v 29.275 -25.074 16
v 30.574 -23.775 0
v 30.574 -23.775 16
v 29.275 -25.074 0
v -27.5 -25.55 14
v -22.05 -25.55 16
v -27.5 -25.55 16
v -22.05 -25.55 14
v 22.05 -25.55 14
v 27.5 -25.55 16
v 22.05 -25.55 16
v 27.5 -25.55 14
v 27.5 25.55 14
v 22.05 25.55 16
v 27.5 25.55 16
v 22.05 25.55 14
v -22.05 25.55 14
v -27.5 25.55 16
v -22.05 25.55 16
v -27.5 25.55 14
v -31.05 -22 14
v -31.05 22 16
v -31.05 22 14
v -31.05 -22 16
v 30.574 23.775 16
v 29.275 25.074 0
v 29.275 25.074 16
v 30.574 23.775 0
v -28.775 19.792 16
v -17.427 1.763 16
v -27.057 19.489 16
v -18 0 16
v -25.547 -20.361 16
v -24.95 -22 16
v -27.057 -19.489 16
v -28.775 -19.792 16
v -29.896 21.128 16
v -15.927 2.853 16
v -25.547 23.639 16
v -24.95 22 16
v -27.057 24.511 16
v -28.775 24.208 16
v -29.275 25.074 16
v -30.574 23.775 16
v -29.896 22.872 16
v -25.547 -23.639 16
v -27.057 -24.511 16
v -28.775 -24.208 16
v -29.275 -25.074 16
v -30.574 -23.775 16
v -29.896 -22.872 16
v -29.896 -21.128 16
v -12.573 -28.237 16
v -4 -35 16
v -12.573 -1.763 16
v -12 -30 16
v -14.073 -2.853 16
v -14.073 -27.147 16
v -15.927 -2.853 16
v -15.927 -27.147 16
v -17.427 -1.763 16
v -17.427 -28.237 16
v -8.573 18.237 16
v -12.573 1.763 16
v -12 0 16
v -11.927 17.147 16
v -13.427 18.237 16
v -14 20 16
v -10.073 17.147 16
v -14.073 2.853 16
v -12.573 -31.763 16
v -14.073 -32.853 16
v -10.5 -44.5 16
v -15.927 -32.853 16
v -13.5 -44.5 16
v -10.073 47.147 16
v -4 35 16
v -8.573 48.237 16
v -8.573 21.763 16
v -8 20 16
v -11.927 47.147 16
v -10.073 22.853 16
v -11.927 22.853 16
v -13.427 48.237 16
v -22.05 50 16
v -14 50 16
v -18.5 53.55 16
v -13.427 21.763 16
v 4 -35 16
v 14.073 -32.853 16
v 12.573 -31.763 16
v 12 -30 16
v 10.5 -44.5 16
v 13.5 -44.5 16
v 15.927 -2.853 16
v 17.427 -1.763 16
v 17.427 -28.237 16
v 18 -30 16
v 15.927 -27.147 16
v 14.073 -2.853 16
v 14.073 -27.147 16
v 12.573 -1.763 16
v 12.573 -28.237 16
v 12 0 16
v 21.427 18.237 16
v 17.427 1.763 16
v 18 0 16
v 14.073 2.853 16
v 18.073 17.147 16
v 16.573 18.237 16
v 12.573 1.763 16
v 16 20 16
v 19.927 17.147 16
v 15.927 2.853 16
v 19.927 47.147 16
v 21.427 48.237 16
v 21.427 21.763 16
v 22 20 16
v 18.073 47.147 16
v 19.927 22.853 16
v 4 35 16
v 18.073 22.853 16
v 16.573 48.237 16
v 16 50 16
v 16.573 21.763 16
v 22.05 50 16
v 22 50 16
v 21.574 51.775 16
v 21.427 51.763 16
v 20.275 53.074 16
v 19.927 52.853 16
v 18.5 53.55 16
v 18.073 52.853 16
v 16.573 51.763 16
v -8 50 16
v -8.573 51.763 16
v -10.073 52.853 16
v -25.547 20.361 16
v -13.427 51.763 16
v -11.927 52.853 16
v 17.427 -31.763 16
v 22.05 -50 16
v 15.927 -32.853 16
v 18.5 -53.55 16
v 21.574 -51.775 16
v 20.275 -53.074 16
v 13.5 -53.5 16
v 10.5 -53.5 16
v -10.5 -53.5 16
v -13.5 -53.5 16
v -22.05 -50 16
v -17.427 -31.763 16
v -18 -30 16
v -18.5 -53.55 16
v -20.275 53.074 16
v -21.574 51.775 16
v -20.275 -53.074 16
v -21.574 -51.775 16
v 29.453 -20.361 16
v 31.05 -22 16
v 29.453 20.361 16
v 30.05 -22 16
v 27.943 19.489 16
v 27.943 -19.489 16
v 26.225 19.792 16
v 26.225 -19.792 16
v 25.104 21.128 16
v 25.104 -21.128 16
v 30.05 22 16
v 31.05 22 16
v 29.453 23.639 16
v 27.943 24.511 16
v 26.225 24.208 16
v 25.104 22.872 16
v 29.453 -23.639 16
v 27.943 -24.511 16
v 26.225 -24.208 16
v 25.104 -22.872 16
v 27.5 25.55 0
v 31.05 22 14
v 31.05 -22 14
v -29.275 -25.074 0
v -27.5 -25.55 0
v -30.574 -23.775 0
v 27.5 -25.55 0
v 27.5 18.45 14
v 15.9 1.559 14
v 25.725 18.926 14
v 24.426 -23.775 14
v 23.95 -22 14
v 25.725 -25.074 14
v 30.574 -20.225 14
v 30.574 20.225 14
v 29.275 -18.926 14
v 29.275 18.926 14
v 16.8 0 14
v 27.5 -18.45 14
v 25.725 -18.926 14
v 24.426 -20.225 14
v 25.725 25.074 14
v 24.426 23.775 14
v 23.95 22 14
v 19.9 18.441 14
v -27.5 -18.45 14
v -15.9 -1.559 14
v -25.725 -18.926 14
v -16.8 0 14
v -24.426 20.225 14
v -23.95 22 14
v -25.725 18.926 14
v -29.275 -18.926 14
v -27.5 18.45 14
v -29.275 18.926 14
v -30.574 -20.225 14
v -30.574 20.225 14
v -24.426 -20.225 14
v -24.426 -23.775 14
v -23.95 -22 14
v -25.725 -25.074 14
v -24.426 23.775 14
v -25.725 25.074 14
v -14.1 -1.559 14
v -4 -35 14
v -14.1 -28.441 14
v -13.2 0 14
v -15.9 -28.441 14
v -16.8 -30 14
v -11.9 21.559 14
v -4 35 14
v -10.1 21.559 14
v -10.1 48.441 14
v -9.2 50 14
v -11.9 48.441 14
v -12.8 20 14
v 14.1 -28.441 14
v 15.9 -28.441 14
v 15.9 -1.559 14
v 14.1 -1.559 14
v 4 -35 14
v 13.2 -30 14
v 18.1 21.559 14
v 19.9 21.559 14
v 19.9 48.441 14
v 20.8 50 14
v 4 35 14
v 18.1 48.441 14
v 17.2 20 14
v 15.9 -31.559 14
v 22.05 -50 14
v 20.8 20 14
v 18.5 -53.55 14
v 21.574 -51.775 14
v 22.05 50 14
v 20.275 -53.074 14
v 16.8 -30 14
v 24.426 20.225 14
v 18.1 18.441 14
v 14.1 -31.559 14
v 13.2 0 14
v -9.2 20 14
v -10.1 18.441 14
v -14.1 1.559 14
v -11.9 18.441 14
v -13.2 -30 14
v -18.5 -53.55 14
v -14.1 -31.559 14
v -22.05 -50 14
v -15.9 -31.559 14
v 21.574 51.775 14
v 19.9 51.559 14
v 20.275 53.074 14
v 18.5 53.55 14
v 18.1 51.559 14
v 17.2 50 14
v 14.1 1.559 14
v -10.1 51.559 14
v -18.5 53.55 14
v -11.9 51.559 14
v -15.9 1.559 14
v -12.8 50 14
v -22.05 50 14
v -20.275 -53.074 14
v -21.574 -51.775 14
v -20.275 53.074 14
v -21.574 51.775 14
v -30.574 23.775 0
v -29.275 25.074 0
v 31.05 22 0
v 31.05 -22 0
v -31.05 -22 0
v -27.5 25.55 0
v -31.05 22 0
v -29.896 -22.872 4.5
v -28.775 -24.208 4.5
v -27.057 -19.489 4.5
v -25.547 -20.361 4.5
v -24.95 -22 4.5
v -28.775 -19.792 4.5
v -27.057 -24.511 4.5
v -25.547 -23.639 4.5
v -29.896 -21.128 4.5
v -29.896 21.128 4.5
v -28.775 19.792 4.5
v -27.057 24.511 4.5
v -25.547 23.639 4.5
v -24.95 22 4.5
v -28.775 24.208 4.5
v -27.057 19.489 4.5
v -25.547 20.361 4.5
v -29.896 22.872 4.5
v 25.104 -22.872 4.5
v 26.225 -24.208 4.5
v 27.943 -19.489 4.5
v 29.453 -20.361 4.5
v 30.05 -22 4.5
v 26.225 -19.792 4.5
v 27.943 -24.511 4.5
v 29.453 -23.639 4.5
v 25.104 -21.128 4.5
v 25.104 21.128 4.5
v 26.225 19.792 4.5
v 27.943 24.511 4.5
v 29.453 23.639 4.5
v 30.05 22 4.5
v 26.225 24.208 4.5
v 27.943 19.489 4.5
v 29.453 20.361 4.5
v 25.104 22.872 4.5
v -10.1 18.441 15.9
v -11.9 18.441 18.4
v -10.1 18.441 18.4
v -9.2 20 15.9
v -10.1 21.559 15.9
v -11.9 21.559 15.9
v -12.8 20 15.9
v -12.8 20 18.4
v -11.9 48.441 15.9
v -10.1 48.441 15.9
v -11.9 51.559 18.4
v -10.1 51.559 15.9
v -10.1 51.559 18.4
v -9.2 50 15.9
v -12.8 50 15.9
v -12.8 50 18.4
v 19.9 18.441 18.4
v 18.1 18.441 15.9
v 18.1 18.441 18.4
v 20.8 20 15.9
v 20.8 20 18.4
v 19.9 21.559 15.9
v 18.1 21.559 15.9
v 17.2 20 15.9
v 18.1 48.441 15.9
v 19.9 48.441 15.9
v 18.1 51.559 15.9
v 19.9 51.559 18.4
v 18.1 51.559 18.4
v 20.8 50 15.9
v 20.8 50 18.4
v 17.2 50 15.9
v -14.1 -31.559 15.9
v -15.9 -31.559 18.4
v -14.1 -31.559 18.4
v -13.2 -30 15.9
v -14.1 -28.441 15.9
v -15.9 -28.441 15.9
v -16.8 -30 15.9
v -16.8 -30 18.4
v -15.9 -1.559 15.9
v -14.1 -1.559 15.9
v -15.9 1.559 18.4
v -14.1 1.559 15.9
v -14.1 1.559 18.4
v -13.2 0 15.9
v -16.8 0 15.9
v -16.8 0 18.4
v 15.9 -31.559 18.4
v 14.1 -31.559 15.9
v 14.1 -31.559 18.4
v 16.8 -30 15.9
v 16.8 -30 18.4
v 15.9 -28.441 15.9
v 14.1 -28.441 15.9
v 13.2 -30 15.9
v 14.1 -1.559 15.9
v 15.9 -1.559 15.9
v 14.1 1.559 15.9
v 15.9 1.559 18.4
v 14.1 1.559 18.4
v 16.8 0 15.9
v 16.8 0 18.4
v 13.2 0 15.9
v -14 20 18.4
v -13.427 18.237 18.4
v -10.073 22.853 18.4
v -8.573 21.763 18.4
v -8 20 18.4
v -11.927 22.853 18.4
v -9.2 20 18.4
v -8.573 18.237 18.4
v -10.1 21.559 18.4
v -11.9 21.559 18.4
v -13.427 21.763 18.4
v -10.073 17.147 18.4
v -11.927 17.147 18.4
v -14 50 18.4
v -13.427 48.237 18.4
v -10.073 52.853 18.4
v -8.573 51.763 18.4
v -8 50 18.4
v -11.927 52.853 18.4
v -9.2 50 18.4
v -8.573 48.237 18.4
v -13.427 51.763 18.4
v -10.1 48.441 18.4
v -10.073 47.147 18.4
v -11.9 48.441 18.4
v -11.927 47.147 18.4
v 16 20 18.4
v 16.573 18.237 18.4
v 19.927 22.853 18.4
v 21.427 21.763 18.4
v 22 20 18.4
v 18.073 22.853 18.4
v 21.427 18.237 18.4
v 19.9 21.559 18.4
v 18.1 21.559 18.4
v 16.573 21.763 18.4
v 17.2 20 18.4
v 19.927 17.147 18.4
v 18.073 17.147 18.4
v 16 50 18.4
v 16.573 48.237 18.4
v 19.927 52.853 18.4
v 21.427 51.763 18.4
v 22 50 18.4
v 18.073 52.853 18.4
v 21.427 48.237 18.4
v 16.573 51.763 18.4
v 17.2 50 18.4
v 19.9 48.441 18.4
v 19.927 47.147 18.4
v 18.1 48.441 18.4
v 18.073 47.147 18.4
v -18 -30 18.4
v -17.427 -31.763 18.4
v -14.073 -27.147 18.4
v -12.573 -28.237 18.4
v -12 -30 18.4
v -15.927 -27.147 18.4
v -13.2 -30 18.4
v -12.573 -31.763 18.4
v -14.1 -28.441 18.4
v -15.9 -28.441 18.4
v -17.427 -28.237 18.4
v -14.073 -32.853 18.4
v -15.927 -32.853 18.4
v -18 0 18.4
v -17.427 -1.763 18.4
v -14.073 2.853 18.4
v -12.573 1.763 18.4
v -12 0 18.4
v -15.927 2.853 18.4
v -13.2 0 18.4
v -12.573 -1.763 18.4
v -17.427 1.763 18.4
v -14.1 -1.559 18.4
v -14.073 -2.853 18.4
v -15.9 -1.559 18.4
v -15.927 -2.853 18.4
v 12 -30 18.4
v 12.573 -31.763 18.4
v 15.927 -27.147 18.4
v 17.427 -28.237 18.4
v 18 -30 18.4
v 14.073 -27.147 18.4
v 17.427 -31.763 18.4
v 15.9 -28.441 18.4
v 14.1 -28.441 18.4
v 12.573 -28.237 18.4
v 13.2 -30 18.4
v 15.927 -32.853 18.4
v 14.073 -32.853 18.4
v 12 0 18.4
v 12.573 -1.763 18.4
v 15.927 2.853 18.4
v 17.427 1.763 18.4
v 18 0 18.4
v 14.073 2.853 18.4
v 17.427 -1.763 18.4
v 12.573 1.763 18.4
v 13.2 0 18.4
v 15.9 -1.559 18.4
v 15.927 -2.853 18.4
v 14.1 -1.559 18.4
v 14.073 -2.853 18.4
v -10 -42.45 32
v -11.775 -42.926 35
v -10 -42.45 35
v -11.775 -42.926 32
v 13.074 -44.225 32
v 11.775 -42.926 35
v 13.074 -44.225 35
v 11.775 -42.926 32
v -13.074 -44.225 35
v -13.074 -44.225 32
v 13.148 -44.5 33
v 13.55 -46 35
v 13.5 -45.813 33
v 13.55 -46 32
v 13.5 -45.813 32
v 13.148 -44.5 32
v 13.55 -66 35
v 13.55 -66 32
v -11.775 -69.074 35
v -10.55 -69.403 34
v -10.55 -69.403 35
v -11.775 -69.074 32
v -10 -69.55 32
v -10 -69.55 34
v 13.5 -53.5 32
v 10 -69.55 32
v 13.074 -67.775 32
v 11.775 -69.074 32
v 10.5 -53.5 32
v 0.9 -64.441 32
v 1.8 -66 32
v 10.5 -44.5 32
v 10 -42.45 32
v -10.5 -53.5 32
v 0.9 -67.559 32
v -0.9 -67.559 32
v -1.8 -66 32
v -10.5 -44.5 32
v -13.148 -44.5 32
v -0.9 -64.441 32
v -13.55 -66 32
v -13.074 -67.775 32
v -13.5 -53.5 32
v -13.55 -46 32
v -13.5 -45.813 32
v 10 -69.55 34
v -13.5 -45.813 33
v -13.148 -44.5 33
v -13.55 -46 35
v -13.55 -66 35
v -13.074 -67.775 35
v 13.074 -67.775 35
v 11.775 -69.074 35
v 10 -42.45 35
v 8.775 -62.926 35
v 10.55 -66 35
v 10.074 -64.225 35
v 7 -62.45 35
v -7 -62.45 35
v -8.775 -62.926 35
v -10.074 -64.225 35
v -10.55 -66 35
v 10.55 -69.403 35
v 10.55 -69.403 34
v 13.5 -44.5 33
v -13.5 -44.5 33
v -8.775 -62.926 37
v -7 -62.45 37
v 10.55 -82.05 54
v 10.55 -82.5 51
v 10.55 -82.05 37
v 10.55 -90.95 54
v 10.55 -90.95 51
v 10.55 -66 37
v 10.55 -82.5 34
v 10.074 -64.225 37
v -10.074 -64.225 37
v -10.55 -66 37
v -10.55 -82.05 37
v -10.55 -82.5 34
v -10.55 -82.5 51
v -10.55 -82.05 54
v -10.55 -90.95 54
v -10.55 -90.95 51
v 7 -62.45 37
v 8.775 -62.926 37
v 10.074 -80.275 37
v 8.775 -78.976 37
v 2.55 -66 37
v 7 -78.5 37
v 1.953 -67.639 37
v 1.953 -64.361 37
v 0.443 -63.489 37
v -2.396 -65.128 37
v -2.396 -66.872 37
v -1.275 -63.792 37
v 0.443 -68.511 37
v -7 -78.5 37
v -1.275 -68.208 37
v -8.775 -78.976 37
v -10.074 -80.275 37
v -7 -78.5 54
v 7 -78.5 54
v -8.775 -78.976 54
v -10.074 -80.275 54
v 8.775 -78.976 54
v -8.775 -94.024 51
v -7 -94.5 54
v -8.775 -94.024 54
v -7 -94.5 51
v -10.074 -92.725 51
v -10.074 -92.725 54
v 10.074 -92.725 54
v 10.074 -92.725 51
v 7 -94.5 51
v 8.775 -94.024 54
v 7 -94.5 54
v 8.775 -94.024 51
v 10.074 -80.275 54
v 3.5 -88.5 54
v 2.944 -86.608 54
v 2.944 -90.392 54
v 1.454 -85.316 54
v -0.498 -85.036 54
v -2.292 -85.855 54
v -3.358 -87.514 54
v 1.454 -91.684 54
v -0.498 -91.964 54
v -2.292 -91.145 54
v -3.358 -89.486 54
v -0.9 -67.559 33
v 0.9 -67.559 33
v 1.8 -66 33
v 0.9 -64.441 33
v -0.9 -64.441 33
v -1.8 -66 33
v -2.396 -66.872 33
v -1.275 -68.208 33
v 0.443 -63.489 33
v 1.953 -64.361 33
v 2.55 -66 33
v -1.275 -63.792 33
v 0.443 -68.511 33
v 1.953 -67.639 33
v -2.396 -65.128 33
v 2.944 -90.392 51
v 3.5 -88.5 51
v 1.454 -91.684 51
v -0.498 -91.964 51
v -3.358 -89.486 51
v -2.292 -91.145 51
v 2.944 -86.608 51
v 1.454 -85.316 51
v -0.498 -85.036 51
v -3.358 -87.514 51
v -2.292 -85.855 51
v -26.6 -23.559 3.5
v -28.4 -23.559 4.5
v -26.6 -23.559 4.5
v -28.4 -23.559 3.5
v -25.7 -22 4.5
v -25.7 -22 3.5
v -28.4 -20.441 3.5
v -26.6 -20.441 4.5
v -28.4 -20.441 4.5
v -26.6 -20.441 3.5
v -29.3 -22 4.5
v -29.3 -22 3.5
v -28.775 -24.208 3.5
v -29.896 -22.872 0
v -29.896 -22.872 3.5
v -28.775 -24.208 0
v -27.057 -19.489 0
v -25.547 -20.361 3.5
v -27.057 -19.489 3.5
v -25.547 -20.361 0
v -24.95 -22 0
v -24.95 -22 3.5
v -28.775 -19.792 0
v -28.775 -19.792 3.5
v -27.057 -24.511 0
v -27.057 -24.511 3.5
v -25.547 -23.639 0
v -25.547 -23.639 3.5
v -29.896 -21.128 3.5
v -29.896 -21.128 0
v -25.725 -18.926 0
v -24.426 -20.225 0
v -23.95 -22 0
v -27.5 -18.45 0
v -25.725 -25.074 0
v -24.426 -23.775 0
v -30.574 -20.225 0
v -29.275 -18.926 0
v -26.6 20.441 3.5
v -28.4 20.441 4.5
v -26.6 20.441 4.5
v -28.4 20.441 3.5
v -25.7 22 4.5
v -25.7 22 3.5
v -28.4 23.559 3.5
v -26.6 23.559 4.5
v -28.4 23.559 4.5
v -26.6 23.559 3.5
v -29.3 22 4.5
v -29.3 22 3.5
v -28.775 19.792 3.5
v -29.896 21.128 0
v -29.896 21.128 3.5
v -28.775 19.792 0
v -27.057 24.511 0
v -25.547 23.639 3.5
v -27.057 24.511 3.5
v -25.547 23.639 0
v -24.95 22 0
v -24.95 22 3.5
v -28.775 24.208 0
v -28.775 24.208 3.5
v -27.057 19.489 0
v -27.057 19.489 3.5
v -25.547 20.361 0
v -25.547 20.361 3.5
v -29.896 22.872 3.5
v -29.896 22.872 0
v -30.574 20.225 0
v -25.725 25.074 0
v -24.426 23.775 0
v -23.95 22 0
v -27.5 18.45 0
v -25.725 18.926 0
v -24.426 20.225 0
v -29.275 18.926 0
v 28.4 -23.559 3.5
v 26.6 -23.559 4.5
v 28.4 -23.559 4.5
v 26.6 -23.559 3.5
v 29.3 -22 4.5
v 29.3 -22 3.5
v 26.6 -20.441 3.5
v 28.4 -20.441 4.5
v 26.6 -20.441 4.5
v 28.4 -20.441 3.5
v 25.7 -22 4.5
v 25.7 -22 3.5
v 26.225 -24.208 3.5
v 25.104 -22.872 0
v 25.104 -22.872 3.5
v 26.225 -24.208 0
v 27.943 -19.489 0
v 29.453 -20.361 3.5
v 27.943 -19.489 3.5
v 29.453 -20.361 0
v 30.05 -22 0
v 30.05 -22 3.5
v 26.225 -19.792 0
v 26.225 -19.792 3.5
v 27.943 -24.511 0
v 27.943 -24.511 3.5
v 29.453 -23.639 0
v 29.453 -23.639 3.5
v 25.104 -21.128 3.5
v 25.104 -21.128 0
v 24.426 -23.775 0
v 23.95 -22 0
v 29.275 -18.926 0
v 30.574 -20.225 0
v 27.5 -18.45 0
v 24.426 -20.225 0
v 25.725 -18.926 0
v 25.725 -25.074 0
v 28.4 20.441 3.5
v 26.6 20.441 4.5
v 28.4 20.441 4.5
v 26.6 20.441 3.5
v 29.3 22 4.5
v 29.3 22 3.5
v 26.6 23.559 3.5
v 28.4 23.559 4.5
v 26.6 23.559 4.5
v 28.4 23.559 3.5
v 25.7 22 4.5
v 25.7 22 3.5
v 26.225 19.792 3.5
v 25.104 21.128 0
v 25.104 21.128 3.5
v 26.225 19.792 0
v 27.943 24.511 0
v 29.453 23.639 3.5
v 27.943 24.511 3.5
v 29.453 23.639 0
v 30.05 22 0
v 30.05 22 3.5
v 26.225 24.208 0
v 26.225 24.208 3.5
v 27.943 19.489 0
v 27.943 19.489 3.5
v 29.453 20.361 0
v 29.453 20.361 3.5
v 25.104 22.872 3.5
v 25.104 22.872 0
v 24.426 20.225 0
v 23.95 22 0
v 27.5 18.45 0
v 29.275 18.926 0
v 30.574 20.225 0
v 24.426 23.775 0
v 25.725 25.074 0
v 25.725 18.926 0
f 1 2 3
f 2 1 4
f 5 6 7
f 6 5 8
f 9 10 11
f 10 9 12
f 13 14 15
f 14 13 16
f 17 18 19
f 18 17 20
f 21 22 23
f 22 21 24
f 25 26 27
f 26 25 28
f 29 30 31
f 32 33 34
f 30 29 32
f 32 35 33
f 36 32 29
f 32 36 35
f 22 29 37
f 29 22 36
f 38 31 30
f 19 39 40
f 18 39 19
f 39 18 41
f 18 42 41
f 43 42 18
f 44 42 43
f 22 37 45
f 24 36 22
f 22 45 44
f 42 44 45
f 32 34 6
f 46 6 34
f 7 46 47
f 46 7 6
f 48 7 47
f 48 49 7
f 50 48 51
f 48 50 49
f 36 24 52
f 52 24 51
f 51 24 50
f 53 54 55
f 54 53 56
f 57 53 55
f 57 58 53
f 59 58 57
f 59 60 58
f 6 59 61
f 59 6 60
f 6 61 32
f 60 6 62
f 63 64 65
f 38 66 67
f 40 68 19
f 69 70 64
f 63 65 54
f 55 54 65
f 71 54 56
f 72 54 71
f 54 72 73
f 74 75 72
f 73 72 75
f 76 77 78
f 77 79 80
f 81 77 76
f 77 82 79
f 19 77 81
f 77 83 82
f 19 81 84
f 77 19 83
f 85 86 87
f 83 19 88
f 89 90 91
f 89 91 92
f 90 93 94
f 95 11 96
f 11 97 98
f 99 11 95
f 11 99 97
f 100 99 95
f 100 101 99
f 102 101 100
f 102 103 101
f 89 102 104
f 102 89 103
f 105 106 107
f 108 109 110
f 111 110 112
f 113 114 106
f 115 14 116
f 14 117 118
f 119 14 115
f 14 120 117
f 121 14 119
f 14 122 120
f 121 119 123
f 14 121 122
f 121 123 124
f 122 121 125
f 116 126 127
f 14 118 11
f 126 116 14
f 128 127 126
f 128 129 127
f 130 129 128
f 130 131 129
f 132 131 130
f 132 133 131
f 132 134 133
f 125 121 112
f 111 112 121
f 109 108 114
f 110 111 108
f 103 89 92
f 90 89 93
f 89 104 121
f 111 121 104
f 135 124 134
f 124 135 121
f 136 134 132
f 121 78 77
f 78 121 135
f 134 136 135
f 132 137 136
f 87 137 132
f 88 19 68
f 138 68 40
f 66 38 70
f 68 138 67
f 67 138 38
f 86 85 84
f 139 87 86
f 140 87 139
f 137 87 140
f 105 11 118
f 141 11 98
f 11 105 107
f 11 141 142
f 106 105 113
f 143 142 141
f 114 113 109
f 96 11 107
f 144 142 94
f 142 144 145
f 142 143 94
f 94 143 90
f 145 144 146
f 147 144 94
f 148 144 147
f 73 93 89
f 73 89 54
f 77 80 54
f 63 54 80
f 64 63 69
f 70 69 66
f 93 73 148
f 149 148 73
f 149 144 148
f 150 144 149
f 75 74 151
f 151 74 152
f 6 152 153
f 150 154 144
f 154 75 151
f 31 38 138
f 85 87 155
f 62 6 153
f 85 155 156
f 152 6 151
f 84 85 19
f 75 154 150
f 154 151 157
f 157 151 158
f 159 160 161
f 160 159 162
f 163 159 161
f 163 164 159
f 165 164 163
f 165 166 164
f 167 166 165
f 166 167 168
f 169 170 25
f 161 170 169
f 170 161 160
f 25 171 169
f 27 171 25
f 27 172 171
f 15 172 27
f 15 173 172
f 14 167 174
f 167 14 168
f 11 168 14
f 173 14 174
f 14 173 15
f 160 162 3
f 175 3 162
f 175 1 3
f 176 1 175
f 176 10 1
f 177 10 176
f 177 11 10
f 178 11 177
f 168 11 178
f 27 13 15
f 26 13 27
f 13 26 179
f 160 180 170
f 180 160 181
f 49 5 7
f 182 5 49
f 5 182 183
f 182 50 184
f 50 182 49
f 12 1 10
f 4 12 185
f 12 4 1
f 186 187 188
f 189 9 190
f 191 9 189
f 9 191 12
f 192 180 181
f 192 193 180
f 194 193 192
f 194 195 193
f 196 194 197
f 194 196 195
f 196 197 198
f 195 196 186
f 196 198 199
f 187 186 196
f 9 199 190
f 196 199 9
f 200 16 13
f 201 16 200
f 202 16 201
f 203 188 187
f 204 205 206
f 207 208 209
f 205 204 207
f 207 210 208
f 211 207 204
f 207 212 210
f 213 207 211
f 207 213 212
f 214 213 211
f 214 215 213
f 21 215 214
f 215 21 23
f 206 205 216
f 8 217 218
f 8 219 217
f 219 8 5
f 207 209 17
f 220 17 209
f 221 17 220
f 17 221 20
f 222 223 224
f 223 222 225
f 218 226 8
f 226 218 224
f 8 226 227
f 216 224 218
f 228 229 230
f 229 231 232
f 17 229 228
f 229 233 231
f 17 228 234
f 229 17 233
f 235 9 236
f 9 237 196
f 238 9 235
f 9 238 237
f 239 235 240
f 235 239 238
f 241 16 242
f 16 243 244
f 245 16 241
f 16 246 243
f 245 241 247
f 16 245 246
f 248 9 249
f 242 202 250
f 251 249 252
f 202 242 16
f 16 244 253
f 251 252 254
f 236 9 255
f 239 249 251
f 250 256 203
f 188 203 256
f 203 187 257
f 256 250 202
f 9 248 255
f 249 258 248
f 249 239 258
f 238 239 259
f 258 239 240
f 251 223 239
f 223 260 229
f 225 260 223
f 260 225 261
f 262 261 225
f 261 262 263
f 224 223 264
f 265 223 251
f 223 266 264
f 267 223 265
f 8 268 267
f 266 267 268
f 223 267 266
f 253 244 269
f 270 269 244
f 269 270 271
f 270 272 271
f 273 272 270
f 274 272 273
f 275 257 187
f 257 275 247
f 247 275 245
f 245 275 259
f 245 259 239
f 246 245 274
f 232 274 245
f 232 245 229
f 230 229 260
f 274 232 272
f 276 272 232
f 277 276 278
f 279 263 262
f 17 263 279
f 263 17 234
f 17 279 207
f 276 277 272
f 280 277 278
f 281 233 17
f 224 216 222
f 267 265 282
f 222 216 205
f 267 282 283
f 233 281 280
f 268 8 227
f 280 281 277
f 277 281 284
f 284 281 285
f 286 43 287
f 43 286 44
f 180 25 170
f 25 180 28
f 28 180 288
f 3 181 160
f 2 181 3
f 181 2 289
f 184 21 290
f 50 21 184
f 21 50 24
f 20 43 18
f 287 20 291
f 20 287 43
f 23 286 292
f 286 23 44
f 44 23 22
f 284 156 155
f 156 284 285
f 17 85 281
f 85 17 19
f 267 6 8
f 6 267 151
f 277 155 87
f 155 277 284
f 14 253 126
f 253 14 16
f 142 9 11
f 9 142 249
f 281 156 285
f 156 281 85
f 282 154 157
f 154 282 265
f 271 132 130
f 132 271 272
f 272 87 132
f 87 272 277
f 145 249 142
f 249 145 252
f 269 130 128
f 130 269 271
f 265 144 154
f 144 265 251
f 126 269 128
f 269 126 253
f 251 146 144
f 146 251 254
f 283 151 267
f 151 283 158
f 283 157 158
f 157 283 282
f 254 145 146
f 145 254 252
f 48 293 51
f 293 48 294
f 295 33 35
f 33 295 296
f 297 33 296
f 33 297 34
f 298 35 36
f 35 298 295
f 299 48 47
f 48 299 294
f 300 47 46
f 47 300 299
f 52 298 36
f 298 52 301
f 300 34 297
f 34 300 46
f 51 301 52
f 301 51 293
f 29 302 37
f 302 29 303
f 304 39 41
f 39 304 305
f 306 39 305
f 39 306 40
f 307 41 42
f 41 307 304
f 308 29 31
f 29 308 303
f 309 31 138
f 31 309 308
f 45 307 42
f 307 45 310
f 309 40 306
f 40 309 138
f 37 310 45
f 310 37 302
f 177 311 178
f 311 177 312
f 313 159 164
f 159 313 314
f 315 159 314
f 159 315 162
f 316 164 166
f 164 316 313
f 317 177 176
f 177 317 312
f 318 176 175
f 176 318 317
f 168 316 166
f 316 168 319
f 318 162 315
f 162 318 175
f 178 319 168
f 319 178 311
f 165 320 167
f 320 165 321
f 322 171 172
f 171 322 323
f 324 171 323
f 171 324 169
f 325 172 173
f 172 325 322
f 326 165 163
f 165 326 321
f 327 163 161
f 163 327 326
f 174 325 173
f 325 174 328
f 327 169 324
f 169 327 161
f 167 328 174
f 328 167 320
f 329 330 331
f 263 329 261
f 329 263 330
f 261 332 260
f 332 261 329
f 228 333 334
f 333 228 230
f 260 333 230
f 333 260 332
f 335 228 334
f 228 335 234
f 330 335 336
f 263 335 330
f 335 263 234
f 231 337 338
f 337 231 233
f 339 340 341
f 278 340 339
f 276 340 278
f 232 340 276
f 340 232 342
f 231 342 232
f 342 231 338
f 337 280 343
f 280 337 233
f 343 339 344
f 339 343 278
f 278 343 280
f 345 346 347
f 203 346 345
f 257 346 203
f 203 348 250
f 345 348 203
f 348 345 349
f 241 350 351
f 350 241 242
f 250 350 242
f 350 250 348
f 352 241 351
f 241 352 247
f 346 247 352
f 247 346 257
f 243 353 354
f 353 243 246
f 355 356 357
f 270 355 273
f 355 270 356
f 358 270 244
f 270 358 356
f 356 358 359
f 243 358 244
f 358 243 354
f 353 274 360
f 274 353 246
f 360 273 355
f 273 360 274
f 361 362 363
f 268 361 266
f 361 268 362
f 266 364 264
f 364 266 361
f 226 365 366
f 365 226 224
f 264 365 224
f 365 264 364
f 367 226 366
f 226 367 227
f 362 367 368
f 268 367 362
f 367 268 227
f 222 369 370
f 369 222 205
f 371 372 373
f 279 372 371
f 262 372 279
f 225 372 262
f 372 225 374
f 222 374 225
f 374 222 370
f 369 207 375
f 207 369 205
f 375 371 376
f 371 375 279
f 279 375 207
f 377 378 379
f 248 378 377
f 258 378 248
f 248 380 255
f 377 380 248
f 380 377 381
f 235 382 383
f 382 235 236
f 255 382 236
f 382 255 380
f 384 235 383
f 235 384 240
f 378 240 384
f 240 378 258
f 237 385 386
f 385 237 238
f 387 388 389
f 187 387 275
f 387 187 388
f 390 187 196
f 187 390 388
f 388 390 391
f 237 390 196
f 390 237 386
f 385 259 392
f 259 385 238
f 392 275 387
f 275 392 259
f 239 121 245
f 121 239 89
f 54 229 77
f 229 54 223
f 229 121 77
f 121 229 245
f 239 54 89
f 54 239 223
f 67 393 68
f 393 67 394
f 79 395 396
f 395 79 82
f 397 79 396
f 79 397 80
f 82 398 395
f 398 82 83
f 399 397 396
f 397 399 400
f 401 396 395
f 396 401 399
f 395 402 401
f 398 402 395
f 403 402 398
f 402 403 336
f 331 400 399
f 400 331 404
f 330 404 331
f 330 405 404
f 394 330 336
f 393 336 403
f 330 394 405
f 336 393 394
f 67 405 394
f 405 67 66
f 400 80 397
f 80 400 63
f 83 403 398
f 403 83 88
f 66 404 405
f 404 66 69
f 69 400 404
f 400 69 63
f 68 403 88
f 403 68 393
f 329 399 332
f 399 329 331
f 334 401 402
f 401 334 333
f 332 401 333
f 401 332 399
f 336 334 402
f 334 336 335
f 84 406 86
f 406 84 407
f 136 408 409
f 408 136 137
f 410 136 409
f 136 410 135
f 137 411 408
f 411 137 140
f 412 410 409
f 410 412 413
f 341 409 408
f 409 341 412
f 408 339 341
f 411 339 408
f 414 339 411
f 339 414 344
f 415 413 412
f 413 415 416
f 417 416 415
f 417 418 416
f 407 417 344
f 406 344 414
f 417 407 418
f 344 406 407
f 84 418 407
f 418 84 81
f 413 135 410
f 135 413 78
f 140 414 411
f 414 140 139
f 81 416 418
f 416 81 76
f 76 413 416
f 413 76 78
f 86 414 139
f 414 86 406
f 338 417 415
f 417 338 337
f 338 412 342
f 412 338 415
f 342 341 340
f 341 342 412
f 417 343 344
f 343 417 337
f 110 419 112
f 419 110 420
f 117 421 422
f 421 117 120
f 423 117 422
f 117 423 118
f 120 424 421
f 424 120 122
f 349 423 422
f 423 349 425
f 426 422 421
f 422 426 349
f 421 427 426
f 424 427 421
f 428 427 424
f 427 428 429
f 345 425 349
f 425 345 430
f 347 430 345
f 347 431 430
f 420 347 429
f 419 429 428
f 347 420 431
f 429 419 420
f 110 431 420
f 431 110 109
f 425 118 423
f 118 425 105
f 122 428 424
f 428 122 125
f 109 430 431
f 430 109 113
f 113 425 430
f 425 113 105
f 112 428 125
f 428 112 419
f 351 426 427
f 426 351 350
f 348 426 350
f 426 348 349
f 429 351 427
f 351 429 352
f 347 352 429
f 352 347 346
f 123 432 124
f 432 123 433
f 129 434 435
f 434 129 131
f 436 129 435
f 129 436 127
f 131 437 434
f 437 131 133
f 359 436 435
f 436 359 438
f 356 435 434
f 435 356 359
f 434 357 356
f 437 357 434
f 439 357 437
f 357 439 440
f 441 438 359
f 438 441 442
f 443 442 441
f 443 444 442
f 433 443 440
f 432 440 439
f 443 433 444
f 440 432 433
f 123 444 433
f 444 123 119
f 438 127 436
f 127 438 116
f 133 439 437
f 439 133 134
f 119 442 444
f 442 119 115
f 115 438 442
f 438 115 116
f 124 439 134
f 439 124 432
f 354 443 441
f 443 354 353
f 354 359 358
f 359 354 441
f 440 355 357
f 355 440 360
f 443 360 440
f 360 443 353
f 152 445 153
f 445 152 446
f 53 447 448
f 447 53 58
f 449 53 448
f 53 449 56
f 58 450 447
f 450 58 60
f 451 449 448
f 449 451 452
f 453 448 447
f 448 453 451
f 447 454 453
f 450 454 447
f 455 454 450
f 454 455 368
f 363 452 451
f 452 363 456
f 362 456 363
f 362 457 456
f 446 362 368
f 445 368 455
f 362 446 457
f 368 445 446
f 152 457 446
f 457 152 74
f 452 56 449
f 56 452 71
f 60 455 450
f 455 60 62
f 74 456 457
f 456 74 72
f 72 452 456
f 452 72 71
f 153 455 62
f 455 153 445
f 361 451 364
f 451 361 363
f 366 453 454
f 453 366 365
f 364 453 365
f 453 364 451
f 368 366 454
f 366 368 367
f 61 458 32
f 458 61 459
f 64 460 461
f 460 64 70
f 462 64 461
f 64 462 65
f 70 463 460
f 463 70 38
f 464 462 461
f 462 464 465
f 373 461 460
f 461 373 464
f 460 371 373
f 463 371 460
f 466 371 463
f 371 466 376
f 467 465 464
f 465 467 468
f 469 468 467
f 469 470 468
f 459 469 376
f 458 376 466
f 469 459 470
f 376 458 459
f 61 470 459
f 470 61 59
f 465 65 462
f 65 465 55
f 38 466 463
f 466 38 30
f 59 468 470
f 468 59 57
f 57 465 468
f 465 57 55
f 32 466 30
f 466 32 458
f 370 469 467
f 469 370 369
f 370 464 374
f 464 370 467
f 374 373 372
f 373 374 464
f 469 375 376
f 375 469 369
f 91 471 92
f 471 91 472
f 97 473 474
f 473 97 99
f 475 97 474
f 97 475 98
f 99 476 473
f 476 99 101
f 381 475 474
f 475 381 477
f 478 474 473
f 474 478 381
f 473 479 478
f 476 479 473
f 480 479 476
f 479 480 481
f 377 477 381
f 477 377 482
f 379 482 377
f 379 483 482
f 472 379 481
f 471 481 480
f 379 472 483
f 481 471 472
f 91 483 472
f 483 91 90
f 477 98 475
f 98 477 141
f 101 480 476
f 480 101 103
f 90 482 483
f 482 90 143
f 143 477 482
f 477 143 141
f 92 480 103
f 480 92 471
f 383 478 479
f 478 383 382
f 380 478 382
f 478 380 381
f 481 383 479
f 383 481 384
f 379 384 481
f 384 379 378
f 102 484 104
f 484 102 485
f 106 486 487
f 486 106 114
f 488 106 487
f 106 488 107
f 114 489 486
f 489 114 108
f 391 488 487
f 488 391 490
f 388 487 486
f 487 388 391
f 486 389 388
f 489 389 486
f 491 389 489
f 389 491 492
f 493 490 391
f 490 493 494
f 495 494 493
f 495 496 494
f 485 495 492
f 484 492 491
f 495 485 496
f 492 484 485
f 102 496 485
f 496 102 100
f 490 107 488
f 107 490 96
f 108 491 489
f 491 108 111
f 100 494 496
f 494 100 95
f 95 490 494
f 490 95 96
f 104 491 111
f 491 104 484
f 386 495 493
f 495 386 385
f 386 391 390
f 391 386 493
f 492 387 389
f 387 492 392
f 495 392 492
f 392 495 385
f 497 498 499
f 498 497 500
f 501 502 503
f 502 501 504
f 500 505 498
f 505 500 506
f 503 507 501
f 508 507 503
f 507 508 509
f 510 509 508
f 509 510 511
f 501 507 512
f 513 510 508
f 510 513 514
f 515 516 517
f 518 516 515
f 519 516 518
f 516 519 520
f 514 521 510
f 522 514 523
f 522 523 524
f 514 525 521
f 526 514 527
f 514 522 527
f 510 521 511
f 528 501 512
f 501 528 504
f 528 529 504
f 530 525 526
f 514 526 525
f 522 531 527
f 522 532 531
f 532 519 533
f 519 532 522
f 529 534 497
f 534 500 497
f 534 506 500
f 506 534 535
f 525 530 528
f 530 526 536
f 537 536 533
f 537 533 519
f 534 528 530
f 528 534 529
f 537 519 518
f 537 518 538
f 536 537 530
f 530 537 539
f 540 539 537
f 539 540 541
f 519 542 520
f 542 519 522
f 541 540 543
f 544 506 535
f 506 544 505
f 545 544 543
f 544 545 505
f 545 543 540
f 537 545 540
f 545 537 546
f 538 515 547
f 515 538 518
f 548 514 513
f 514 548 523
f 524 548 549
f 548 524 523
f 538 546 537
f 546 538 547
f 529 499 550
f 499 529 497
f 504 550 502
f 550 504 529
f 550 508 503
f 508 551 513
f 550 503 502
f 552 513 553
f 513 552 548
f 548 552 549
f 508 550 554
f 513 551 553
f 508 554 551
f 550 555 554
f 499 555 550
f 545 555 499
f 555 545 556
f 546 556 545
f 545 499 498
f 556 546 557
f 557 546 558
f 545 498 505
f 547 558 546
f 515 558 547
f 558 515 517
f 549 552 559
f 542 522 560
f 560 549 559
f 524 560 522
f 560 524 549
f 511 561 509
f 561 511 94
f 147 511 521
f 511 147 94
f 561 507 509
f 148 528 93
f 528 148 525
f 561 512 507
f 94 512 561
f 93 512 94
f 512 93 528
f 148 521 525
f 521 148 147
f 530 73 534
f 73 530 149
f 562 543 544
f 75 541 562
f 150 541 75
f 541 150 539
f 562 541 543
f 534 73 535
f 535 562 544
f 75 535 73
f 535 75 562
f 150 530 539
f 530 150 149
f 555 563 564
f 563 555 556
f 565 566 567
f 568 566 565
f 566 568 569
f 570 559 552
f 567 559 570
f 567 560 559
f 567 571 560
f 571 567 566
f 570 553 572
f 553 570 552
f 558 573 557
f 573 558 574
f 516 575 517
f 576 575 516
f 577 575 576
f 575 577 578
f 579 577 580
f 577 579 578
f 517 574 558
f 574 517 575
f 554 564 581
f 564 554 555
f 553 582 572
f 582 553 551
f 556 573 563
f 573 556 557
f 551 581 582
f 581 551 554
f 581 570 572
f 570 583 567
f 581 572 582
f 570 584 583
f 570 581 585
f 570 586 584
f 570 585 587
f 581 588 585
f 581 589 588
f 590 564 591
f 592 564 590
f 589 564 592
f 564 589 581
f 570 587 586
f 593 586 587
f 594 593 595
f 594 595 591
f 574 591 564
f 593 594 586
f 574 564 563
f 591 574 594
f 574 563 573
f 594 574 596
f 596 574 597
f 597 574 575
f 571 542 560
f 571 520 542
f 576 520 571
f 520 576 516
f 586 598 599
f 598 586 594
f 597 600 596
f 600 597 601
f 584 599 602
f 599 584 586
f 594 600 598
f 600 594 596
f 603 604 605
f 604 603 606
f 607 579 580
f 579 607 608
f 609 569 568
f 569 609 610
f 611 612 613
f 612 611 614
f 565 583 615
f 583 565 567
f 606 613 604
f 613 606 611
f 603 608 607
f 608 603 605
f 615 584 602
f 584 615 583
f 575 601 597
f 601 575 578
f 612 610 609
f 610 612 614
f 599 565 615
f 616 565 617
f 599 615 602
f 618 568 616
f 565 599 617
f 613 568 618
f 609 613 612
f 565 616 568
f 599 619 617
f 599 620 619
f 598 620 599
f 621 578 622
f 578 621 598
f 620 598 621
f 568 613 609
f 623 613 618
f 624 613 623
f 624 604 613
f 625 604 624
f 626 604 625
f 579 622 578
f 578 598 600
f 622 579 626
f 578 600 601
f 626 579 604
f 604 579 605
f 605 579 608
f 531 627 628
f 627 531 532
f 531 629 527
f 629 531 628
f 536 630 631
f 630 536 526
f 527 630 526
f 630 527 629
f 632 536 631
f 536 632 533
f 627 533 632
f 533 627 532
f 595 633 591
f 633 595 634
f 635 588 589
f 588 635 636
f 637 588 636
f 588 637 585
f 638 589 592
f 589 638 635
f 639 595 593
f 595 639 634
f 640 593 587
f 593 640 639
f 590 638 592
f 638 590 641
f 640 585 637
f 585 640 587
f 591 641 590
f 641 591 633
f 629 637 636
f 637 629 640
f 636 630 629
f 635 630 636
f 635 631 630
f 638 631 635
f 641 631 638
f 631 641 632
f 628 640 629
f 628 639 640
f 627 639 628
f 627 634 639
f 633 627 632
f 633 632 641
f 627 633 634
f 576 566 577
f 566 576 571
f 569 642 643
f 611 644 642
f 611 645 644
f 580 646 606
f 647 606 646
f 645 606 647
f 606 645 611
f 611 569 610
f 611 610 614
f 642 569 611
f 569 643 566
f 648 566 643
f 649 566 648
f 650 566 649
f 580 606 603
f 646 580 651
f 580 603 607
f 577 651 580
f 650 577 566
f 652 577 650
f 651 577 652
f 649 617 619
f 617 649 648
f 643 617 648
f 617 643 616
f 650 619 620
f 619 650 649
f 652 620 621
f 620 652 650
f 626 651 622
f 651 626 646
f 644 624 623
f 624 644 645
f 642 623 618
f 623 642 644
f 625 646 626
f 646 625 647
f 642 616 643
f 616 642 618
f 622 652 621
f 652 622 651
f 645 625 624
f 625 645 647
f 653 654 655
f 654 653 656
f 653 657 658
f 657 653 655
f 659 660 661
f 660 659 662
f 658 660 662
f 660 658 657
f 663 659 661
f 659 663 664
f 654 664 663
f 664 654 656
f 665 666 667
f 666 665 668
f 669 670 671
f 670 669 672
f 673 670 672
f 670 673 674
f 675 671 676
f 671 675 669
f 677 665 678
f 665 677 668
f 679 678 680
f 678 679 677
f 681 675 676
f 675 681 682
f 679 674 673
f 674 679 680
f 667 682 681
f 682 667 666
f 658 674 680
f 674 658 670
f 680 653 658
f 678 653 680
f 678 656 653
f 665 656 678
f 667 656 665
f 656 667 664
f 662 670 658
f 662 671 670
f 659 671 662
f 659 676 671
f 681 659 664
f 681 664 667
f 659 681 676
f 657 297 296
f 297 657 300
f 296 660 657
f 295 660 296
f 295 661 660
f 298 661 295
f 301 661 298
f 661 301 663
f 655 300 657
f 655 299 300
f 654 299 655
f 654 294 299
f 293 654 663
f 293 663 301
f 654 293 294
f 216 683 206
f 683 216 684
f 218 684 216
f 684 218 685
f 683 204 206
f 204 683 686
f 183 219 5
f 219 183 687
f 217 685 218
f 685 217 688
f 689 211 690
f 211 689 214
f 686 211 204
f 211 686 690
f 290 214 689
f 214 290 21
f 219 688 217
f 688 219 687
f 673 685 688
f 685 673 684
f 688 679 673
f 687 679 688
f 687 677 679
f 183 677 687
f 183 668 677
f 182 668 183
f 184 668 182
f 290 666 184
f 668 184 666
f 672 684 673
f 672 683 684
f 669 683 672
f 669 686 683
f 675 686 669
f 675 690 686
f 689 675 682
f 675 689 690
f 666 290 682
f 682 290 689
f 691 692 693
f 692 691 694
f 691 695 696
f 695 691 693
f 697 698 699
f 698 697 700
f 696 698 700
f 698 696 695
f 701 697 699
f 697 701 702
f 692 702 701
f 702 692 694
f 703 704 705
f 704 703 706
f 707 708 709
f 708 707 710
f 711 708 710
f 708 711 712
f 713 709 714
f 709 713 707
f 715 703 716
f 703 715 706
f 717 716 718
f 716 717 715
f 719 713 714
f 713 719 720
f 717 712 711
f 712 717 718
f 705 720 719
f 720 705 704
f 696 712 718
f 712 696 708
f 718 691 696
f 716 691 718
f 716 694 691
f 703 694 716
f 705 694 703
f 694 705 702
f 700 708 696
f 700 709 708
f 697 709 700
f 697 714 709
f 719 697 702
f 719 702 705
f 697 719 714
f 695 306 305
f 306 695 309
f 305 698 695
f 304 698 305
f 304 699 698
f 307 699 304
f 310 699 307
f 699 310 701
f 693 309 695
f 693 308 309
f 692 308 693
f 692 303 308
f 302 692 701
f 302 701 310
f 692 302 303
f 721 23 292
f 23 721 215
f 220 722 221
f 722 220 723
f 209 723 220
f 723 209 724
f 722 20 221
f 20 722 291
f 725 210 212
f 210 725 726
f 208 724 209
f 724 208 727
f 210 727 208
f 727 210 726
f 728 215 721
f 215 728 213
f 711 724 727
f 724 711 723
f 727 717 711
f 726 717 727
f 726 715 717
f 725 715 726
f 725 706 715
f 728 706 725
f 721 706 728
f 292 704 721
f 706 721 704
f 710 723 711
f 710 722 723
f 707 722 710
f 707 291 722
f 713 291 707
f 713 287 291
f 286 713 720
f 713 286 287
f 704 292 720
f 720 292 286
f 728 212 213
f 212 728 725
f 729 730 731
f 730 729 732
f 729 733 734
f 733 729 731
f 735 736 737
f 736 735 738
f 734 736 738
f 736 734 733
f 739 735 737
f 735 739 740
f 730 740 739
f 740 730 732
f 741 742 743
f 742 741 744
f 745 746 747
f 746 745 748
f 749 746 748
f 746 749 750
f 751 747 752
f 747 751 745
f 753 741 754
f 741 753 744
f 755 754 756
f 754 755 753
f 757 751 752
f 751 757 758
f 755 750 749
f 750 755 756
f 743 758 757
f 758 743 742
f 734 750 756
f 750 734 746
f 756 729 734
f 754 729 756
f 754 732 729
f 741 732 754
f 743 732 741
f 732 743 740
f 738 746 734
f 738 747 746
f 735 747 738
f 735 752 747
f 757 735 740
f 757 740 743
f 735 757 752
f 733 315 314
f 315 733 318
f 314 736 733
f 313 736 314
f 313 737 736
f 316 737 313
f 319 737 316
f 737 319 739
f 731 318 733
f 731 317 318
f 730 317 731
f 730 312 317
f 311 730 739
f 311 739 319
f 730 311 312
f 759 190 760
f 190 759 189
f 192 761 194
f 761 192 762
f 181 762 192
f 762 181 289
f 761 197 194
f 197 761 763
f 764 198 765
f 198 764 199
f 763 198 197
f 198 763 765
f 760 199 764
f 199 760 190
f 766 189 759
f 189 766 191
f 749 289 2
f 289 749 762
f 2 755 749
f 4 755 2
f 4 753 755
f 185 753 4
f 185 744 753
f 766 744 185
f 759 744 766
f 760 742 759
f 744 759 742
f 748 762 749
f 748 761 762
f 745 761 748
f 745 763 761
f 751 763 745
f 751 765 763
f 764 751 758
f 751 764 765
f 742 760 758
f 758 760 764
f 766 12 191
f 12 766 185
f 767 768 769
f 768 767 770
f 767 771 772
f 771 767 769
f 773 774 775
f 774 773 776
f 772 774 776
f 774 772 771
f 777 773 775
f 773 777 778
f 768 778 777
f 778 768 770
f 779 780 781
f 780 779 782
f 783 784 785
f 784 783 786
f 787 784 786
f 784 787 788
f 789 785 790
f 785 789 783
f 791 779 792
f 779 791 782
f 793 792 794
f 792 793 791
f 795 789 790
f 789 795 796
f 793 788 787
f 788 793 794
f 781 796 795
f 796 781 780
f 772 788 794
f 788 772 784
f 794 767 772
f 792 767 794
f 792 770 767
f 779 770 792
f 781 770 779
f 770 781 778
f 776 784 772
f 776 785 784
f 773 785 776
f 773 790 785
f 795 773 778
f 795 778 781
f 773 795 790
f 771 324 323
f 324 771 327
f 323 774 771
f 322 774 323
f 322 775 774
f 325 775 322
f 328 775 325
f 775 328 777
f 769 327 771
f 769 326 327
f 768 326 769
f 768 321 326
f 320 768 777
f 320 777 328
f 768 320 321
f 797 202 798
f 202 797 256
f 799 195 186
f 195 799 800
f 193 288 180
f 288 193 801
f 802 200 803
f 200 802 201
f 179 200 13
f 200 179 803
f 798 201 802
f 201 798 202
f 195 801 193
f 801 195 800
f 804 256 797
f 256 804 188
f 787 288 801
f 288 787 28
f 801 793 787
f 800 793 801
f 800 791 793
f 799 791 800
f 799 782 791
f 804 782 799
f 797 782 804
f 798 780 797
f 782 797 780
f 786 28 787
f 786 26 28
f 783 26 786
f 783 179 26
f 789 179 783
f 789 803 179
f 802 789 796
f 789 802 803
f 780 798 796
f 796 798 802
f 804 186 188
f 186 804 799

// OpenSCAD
LowClearance=10+4;

L_holderD = 6.5+.6;
L_holderD_in = 5.1;

screwR = 1.5+0.3;
screwR2 = 1.5+0.5-0.1-0.1;

TableThickness = 2.;

module corner(height) {
 cylinder(r1=L_holderD/2, r2=L_holderD/2, h=height, $n=60);
}
   
    
module L_holder() {
 difference() {
   cylinder(r1=L_holderD/2, r2=L_holderD/2, h=LowClearance, $n=60);
   union() {
     cylinder(r1=screwR , r2=screwR, h=LowClearance, $n=60);
     translate([0, 0, -LowClearance+3.5]) 
       cylinder(r1=L_holderD_in/2, r2=L_holderD_in/2, h=LowClearance, $n=60);
     translate([0, 0, +3.5+1]) 
       cylinder(r1=L_holderD_in/2, r2=L_holderD_in/2, h=LowClearance, $n=60);
   }
 }
}


module U_holder() {
 difference() {
   cylinder(r1=6/2, r2=6/2, h=2.5, $n=60);
   union() {
     cylinder(r1=screwR2 , r2=screwR2, h=10, $n=60);
   }
 }
}

module base() {

  // Main table
  translate([0, 0, LowClearance]) {
    difference() {  
      union() {
        hull() {
          translate([-55/2, -44/2, 0])
            corner(TableThickness);

          translate([-55/2, +44/2, 0])
            corner(TableThickness);

          translate([+55/2, -44/2, 0])
            corner(TableThickness);

          translate([+55/2, +44/2, 0])
            corner(TableThickness);
        }
        hull() {
          translate([-37/2, -100/2, 0])
            corner(TableThickness);

          translate([-37/2, +100/2, 0])
            corner(TableThickness);

          translate([+37/2, -100/2, 0])
            corner(TableThickness);

          translate([+37/2, +100/2, 0])
            corner(TableThickness);
        }    
      }
      union() { 
        // Screw holes for lower pillars
        translate([-55/2, -44/2, 0]) {
          cylinder(r1=screwR , r2=screwR , h=10, $n=60);    
          cylinder(r1=L_holderD_in/2, r2=L_holderD_in/2, h=10, $n=60);
        }

        translate([-55/2, +44/2, 0]) {
          cylinder(r1=screwR , r2=screwR , h=10, $n=60);
          cylinder(r1=L_holderD_in/2, r2=L_holderD_in/2, h=10, $n=60);
        }         

        translate([+55/2, -44/2, 0]) {
          cylinder(r1=screwR , r2=screwR , h=10, $n=60);
          cylinder(r1=L_holderD_in/2, r2=L_holderD_in/2, h=10, $n=60);
        }

        translate([+55/2, +44/2, 0]) {
          cylinder(r1=screwR , r2=screwR , h=10, $n=60);
          cylinder(r1=L_holderD_in/2, r2=L_holderD_in/2, h=10, $n=60);
        }
        
        // Screw holes for upper pillars
        translate([4, 35, 0]) {
          translate([-30/2, -30/2, 0])
            cylinder(r1=screwR2 , r2=screwR2, h=10, $n=60);        
          translate([-30/2, +30/2, 0])
            cylinder(r1=screwR2 , r2=screwR2, h=10, $n=60);
          translate([+30/2, -30/2, 0])
            cylinder(r1=screwR2 , r2=screwR2, h=10, $n=60);
          translate([+30/2, +30/2, 0])
            cylinder(r1=screwR2 , r2=screwR2, h=10, $n=60);
        }
        translate([0, -15, 0]) {
          translate([-30/2, -30/2, 0])
            cylinder(r1=screwR2 , r2=screwR2, h=10, $n=60);
          translate([-30/2, +30/2, 0])
            cylinder(r1=screwR2 , r2=screwR2, h=10, $n=60);
          translate([+30/2, -30/2, 0])
            cylinder(r1=screwR2 , r2=screwR2, h=10, $n=60);
          translate([+30/2, +30/2, 0])
            cylinder(r1=screwR2 , r2=screwR2, h=10, $n=60);
        }
                
        // Cut in the table
        cube([8, 70, 20], center=true);
      }
    }
    // Upper pillars
    translate([4, 35, 0]) {
      translate([-30/2, -30/2, TableThickness-0.1])
        U_holder();
      translate([-30/2, +30/2, TableThickness-0.1])
        U_holder();
      translate([+30/2, -30/2, TableThickness-0.1])
        U_holder();
      translate([+30/2, +30/2, TableThickness-0.1])
        U_holder();
    }
    translate([0, -15, 0]) {
      translate([-30/2, -30/2, TableThickness-0.1])
        U_holder();
      translate([-30/2, +30/2, TableThickness-0.1])
        U_holder();
      translate([+30/2, -30/2, TableThickness-0.1])
        U_holder();
      translate([+30/2, +30/2, TableThickness-0.1])
        U_holder();
    }
  }
  
  // Upper table
  difference() {
    union() {
      translate([0, -44/2+20/2-44, 10+22])
        union() {
          hull() {
            translate([-20/2, -20/2, 0])
              corner(3);
            translate([-20/2, +20/2, 0])
              corner(3);
            translate([+20/2, -20/2, 0])
              corner(3);
            translate([+20/2, +20/2, 0])
              corner(3);       
          }
          translate([20/2+2, 20/2-10/2+2, -(32-LowClearance)/2+1]) 
            cube([3, 9, 32-LowClearance], center=true);      
          translate([-(20/2+2), 20/2-10/2+2, -(32-LowClearance)/2+1]) 
            cube([3, 9, 32-LowClearance], center=true);      
        }
        
      // Mounting bracket for the video TX
      translate([0, -44/2+20/2-44-20, 10+22+2])
        union() {
          hull() {
            translate([-14/2, -20/2, 0])
              corner(3);
            translate([-14/2, +20/2, 0])
              corner(3);
            translate([+14/2, -20/2, 0])
              corner(3);
            translate([+14/2, +20/2, 0])
              corner(3);       
          }
        }
      translate([0, -44/2+20/2-44-20-8.5-2, 10+22+3])
        union() {
          hull() {
            translate([-14/2, -(16-L_holderD)/2, 0])
              corner(19);
            translate([-14/2, +(16-L_holderD)/2, 0])
              corner(19);
            translate([+14/2, -(16-L_holderD)/2, 0])
              corner(19);
            translate([+14/2, +(16-L_holderD)/2, 0])
              corner(19);       
          }
        }
        
    }

    union() { // Subtractive part of Video TX bracket
      translate([0, -44/2+20/2-44-20-8.5-10+8-3, 10+22+3-3])
        union() {
          hull() {
            translate([-34/2, -(14-L_holderD)/2, 0])
              corner(19);
            translate([-34/2, +(14-L_holderD)/2, 0])
              corner(19);
            translate([+34/2, -(14-L_holderD)/2, 0])
              corner(19);
            translate([+34/2, +(14-L_holderD)/2, 0])
              corner(19);       
          }
        }
      
      translate([0, -44/2-44, 0]){
        cylinder(r1=screwR , r2=screwR , h=100, $n=60);
        translate([0, 0, 10+22+1])
          cylinder(r1=L_holderD_in/2, r2=L_holderD_in/2, h=10, $n=60);     
      }
      // Hole for video TX antenna
      translate([0, -44/2+20/2-44-20-8.5-10+8-2, 0]){
        cylinder(r1=7/2 , r2=7/2, h=100, $n=60);
      }
    }
  }      
 

// Lower pillars
  translate([-55/2, -44/2, 0])
    L_holder();

  translate([-55/2, +44/2, 0])
    L_holder();

  translate([+55/2, -44/2, 0])
    L_holder();

  translate([+55/2, +44/2, 0])
    L_holder();
    
    
}

base();
//  L_holder();

//translate([0, 10, 0])
//  U_holder();
